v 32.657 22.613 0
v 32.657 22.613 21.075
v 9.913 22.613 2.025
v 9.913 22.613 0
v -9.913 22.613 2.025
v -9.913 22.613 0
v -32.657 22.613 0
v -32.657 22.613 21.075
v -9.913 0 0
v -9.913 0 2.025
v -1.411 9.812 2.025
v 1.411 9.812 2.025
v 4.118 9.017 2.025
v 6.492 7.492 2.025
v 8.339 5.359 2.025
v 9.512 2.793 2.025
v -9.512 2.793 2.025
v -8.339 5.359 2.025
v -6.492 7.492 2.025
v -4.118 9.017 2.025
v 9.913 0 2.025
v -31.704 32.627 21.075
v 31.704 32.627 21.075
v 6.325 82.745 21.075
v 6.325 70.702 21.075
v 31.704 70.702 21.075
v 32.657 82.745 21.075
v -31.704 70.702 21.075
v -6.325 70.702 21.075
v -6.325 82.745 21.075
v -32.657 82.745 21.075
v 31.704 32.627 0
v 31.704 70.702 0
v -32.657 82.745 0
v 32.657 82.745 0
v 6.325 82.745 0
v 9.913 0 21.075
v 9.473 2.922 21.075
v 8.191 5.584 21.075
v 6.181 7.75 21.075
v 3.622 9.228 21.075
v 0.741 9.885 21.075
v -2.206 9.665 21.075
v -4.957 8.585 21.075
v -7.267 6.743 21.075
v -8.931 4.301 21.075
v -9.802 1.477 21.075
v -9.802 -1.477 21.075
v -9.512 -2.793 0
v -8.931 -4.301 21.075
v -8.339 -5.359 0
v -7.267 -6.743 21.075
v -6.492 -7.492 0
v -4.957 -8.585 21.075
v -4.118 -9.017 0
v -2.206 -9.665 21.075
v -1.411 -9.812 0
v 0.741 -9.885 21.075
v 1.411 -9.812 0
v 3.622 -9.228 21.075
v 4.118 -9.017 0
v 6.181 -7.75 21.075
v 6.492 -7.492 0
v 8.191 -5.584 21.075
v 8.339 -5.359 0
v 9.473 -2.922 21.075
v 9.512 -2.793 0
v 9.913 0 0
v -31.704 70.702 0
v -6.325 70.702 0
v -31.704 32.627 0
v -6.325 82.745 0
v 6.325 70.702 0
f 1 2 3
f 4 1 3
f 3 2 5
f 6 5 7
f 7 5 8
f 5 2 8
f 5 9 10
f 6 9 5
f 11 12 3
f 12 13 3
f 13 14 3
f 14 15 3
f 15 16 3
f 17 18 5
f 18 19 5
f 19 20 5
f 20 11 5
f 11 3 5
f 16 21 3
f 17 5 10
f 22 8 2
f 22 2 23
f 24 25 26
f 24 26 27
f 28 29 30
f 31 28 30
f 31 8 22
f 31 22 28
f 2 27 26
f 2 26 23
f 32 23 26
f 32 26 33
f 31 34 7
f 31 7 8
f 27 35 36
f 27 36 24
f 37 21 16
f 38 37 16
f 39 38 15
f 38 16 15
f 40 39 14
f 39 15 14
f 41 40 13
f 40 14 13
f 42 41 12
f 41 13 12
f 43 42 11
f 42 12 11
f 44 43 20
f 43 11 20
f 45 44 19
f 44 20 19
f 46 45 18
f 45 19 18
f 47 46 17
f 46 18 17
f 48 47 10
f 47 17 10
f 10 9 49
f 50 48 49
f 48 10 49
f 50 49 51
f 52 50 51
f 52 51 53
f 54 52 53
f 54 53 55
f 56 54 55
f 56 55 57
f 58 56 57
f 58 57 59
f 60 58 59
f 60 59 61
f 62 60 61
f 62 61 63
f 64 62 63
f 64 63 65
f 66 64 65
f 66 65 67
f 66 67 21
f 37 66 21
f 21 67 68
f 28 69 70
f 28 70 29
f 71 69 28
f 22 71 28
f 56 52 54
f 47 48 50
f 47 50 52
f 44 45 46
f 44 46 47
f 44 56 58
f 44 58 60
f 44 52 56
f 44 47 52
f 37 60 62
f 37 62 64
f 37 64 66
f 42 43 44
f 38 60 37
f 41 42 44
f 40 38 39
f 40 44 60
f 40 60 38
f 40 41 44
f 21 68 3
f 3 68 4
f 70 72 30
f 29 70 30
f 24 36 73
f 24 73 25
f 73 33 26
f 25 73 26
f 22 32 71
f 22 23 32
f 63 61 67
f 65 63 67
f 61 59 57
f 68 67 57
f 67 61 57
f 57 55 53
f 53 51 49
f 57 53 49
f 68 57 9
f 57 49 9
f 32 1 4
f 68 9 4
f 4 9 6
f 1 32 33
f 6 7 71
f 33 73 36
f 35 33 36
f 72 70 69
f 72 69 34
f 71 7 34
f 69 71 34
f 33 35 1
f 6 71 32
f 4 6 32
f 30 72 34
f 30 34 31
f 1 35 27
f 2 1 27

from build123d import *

# Parameters (mm, degrees)
SKETCH1_R           = 9.913174659
BOSS_EXTRUDE1_DEPTH = 21.074744356
SKETCH2_W           = 19.826349318
SKETCH2_H           = 22.613174659
BOSS_EXTRUDE2_DEPTH = 2.024744356
SKETCH3_W           = 63.40856
SKETCH3_H           = 21.074744356
BOSS_EXTRUDE3_DEPTH = 10.014018179
SKETCH4_W           = 0.952402748
SKETCH4_H           = 21.074744356
BOSS_EXTRUDE4_DEPTH = 38.0746
SKETCH5_W           = 0.952402748
SKETCH5_H           = 21.074744356
BOSS_EXTRUDE5_DEPTH = 10.014018179
SKETCH6_W           = 21.074744356
SKETCH6_H           = 12.042842766
BOSS_EXTRUDE6_DEPTH = 25.37968
SKETCH6_3_W         = 21.074744356
SKETCH6_3_H         = 12.042842766
BOSS_EXTRUDE7_DEPTH = 0.952402748


with BuildPart() as part:
    # Sketch1 → Boss-Extrude1 (new body)
    with BuildSketch(Plane.XY):
        Circle(SKETCH1_R)
    extrude(amount=BOSS_EXTRUDE1_DEPTH)

    # Sketch2 → Boss-Extrude2 (add)
    with BuildSketch(Plane(origin=(0, 0, 0), x_dir=(-1, 0, 0), z_dir=(0, 0, -1))):
        with Locations((0, 11.30658733)):
            Rectangle(SKETCH2_W, SKETCH2_H)
    extrude(amount=-BOSS_EXTRUDE2_DEPTH)

    # Sketch3 → Boss-Extrude3 (add)
    with BuildSketch(Plane(origin=(0, 22.613174659, 0), x_dir=(1, 0, 0), z_dir=(0, 1, 0))):
        with Locations((0, -10.537372178)):
            Rectangle(SKETCH3_W, SKETCH3_H)
    extrude(amount=BOSS_EXTRUDE3_DEPTH)



with BuildPart() as body_2:
    # Sketch4 → Boss-Extrude4 (new body)
    with BuildSketch(Plane(origin=(0, 32.627192838, 0), x_dir=(1, 0, 0), z_dir=(0, 1, 0))):
        with Locations((32.180481374, -10.537372178)):
            Rectangle(SKETCH4_W, SKETCH4_H)
    boss_extrude4 = extrude(amount=BOSS_EXTRUDE4_DEPTH)


with BuildPart() as part_1:
    add(part.part)

    add(body_2.part)  # Boss-Extrude5 merges body 2
    # Sketch5 → Boss-Extrude5 (add)
    with BuildSketch(Plane.XZ.offset(-32.627192838)):
        with Locations((32.180481374, 10.537372178)):
            Rectangle(SKETCH5_W, SKETCH5_H)
    boss_extrude5 = extrude(amount=BOSS_EXTRUDE5_DEPTH)



with BuildPart() as body_2_2:
    # Sketch6 → Boss-Extrude6 (new body)
    with BuildSketch(Plane.ZY.offset(-31.70428)):
        with Locations((10.537372178, 76.723214221)):
            Rectangle(SKETCH6_W, SKETCH6_H)
    boss_extrude6 = extrude(amount=BOSS_EXTRUDE6_DEPTH)


with BuildPart() as part_2:
    add(part_1.part)

    add(body_2_2.part)  # Boss-Extrude7 merges body 2 2
    # Sketch6<3> → Boss-Extrude7 (add)
    with BuildSketch(Plane.ZY.offset(-31.70428)):
        with Locations((10.537372178, 76.723214221)):
            Rectangle(SKETCH6_3_W, SKETCH6_3_H)
    boss_extrude7 = extrude(amount=-BOSS_EXTRUDE7_DEPTH)

    # Mirror4: Boss-Extrude5 across plane
    add(boss_extrude5.mirror(Plane(origin=(0, 0, 0), x_dir=(0, 0, 1), z_dir=(1, 0, 0))))

    # Mirror5: Boss-Extrude4 across plane
    add(boss_extrude4.mirror(Plane(origin=(0, 0, 0), x_dir=(0, 0, 1), z_dir=(1, 0, 0))))

    # Mirror8: Boss-Extrude7 across plane
    add(boss_extrude7.mirror(Plane(origin=(0, 0, 0), x_dir=(0, 0, 1), z_dir=(1, 0, 0))))

    # Mirror9: Boss-Extrude6 across plane
    add(boss_extrude6.mirror(Plane(origin=(0, 0, 0), x_dir=(0, 0, 1), z_dir=(1, 0, 0))))


solid = part_2.part
